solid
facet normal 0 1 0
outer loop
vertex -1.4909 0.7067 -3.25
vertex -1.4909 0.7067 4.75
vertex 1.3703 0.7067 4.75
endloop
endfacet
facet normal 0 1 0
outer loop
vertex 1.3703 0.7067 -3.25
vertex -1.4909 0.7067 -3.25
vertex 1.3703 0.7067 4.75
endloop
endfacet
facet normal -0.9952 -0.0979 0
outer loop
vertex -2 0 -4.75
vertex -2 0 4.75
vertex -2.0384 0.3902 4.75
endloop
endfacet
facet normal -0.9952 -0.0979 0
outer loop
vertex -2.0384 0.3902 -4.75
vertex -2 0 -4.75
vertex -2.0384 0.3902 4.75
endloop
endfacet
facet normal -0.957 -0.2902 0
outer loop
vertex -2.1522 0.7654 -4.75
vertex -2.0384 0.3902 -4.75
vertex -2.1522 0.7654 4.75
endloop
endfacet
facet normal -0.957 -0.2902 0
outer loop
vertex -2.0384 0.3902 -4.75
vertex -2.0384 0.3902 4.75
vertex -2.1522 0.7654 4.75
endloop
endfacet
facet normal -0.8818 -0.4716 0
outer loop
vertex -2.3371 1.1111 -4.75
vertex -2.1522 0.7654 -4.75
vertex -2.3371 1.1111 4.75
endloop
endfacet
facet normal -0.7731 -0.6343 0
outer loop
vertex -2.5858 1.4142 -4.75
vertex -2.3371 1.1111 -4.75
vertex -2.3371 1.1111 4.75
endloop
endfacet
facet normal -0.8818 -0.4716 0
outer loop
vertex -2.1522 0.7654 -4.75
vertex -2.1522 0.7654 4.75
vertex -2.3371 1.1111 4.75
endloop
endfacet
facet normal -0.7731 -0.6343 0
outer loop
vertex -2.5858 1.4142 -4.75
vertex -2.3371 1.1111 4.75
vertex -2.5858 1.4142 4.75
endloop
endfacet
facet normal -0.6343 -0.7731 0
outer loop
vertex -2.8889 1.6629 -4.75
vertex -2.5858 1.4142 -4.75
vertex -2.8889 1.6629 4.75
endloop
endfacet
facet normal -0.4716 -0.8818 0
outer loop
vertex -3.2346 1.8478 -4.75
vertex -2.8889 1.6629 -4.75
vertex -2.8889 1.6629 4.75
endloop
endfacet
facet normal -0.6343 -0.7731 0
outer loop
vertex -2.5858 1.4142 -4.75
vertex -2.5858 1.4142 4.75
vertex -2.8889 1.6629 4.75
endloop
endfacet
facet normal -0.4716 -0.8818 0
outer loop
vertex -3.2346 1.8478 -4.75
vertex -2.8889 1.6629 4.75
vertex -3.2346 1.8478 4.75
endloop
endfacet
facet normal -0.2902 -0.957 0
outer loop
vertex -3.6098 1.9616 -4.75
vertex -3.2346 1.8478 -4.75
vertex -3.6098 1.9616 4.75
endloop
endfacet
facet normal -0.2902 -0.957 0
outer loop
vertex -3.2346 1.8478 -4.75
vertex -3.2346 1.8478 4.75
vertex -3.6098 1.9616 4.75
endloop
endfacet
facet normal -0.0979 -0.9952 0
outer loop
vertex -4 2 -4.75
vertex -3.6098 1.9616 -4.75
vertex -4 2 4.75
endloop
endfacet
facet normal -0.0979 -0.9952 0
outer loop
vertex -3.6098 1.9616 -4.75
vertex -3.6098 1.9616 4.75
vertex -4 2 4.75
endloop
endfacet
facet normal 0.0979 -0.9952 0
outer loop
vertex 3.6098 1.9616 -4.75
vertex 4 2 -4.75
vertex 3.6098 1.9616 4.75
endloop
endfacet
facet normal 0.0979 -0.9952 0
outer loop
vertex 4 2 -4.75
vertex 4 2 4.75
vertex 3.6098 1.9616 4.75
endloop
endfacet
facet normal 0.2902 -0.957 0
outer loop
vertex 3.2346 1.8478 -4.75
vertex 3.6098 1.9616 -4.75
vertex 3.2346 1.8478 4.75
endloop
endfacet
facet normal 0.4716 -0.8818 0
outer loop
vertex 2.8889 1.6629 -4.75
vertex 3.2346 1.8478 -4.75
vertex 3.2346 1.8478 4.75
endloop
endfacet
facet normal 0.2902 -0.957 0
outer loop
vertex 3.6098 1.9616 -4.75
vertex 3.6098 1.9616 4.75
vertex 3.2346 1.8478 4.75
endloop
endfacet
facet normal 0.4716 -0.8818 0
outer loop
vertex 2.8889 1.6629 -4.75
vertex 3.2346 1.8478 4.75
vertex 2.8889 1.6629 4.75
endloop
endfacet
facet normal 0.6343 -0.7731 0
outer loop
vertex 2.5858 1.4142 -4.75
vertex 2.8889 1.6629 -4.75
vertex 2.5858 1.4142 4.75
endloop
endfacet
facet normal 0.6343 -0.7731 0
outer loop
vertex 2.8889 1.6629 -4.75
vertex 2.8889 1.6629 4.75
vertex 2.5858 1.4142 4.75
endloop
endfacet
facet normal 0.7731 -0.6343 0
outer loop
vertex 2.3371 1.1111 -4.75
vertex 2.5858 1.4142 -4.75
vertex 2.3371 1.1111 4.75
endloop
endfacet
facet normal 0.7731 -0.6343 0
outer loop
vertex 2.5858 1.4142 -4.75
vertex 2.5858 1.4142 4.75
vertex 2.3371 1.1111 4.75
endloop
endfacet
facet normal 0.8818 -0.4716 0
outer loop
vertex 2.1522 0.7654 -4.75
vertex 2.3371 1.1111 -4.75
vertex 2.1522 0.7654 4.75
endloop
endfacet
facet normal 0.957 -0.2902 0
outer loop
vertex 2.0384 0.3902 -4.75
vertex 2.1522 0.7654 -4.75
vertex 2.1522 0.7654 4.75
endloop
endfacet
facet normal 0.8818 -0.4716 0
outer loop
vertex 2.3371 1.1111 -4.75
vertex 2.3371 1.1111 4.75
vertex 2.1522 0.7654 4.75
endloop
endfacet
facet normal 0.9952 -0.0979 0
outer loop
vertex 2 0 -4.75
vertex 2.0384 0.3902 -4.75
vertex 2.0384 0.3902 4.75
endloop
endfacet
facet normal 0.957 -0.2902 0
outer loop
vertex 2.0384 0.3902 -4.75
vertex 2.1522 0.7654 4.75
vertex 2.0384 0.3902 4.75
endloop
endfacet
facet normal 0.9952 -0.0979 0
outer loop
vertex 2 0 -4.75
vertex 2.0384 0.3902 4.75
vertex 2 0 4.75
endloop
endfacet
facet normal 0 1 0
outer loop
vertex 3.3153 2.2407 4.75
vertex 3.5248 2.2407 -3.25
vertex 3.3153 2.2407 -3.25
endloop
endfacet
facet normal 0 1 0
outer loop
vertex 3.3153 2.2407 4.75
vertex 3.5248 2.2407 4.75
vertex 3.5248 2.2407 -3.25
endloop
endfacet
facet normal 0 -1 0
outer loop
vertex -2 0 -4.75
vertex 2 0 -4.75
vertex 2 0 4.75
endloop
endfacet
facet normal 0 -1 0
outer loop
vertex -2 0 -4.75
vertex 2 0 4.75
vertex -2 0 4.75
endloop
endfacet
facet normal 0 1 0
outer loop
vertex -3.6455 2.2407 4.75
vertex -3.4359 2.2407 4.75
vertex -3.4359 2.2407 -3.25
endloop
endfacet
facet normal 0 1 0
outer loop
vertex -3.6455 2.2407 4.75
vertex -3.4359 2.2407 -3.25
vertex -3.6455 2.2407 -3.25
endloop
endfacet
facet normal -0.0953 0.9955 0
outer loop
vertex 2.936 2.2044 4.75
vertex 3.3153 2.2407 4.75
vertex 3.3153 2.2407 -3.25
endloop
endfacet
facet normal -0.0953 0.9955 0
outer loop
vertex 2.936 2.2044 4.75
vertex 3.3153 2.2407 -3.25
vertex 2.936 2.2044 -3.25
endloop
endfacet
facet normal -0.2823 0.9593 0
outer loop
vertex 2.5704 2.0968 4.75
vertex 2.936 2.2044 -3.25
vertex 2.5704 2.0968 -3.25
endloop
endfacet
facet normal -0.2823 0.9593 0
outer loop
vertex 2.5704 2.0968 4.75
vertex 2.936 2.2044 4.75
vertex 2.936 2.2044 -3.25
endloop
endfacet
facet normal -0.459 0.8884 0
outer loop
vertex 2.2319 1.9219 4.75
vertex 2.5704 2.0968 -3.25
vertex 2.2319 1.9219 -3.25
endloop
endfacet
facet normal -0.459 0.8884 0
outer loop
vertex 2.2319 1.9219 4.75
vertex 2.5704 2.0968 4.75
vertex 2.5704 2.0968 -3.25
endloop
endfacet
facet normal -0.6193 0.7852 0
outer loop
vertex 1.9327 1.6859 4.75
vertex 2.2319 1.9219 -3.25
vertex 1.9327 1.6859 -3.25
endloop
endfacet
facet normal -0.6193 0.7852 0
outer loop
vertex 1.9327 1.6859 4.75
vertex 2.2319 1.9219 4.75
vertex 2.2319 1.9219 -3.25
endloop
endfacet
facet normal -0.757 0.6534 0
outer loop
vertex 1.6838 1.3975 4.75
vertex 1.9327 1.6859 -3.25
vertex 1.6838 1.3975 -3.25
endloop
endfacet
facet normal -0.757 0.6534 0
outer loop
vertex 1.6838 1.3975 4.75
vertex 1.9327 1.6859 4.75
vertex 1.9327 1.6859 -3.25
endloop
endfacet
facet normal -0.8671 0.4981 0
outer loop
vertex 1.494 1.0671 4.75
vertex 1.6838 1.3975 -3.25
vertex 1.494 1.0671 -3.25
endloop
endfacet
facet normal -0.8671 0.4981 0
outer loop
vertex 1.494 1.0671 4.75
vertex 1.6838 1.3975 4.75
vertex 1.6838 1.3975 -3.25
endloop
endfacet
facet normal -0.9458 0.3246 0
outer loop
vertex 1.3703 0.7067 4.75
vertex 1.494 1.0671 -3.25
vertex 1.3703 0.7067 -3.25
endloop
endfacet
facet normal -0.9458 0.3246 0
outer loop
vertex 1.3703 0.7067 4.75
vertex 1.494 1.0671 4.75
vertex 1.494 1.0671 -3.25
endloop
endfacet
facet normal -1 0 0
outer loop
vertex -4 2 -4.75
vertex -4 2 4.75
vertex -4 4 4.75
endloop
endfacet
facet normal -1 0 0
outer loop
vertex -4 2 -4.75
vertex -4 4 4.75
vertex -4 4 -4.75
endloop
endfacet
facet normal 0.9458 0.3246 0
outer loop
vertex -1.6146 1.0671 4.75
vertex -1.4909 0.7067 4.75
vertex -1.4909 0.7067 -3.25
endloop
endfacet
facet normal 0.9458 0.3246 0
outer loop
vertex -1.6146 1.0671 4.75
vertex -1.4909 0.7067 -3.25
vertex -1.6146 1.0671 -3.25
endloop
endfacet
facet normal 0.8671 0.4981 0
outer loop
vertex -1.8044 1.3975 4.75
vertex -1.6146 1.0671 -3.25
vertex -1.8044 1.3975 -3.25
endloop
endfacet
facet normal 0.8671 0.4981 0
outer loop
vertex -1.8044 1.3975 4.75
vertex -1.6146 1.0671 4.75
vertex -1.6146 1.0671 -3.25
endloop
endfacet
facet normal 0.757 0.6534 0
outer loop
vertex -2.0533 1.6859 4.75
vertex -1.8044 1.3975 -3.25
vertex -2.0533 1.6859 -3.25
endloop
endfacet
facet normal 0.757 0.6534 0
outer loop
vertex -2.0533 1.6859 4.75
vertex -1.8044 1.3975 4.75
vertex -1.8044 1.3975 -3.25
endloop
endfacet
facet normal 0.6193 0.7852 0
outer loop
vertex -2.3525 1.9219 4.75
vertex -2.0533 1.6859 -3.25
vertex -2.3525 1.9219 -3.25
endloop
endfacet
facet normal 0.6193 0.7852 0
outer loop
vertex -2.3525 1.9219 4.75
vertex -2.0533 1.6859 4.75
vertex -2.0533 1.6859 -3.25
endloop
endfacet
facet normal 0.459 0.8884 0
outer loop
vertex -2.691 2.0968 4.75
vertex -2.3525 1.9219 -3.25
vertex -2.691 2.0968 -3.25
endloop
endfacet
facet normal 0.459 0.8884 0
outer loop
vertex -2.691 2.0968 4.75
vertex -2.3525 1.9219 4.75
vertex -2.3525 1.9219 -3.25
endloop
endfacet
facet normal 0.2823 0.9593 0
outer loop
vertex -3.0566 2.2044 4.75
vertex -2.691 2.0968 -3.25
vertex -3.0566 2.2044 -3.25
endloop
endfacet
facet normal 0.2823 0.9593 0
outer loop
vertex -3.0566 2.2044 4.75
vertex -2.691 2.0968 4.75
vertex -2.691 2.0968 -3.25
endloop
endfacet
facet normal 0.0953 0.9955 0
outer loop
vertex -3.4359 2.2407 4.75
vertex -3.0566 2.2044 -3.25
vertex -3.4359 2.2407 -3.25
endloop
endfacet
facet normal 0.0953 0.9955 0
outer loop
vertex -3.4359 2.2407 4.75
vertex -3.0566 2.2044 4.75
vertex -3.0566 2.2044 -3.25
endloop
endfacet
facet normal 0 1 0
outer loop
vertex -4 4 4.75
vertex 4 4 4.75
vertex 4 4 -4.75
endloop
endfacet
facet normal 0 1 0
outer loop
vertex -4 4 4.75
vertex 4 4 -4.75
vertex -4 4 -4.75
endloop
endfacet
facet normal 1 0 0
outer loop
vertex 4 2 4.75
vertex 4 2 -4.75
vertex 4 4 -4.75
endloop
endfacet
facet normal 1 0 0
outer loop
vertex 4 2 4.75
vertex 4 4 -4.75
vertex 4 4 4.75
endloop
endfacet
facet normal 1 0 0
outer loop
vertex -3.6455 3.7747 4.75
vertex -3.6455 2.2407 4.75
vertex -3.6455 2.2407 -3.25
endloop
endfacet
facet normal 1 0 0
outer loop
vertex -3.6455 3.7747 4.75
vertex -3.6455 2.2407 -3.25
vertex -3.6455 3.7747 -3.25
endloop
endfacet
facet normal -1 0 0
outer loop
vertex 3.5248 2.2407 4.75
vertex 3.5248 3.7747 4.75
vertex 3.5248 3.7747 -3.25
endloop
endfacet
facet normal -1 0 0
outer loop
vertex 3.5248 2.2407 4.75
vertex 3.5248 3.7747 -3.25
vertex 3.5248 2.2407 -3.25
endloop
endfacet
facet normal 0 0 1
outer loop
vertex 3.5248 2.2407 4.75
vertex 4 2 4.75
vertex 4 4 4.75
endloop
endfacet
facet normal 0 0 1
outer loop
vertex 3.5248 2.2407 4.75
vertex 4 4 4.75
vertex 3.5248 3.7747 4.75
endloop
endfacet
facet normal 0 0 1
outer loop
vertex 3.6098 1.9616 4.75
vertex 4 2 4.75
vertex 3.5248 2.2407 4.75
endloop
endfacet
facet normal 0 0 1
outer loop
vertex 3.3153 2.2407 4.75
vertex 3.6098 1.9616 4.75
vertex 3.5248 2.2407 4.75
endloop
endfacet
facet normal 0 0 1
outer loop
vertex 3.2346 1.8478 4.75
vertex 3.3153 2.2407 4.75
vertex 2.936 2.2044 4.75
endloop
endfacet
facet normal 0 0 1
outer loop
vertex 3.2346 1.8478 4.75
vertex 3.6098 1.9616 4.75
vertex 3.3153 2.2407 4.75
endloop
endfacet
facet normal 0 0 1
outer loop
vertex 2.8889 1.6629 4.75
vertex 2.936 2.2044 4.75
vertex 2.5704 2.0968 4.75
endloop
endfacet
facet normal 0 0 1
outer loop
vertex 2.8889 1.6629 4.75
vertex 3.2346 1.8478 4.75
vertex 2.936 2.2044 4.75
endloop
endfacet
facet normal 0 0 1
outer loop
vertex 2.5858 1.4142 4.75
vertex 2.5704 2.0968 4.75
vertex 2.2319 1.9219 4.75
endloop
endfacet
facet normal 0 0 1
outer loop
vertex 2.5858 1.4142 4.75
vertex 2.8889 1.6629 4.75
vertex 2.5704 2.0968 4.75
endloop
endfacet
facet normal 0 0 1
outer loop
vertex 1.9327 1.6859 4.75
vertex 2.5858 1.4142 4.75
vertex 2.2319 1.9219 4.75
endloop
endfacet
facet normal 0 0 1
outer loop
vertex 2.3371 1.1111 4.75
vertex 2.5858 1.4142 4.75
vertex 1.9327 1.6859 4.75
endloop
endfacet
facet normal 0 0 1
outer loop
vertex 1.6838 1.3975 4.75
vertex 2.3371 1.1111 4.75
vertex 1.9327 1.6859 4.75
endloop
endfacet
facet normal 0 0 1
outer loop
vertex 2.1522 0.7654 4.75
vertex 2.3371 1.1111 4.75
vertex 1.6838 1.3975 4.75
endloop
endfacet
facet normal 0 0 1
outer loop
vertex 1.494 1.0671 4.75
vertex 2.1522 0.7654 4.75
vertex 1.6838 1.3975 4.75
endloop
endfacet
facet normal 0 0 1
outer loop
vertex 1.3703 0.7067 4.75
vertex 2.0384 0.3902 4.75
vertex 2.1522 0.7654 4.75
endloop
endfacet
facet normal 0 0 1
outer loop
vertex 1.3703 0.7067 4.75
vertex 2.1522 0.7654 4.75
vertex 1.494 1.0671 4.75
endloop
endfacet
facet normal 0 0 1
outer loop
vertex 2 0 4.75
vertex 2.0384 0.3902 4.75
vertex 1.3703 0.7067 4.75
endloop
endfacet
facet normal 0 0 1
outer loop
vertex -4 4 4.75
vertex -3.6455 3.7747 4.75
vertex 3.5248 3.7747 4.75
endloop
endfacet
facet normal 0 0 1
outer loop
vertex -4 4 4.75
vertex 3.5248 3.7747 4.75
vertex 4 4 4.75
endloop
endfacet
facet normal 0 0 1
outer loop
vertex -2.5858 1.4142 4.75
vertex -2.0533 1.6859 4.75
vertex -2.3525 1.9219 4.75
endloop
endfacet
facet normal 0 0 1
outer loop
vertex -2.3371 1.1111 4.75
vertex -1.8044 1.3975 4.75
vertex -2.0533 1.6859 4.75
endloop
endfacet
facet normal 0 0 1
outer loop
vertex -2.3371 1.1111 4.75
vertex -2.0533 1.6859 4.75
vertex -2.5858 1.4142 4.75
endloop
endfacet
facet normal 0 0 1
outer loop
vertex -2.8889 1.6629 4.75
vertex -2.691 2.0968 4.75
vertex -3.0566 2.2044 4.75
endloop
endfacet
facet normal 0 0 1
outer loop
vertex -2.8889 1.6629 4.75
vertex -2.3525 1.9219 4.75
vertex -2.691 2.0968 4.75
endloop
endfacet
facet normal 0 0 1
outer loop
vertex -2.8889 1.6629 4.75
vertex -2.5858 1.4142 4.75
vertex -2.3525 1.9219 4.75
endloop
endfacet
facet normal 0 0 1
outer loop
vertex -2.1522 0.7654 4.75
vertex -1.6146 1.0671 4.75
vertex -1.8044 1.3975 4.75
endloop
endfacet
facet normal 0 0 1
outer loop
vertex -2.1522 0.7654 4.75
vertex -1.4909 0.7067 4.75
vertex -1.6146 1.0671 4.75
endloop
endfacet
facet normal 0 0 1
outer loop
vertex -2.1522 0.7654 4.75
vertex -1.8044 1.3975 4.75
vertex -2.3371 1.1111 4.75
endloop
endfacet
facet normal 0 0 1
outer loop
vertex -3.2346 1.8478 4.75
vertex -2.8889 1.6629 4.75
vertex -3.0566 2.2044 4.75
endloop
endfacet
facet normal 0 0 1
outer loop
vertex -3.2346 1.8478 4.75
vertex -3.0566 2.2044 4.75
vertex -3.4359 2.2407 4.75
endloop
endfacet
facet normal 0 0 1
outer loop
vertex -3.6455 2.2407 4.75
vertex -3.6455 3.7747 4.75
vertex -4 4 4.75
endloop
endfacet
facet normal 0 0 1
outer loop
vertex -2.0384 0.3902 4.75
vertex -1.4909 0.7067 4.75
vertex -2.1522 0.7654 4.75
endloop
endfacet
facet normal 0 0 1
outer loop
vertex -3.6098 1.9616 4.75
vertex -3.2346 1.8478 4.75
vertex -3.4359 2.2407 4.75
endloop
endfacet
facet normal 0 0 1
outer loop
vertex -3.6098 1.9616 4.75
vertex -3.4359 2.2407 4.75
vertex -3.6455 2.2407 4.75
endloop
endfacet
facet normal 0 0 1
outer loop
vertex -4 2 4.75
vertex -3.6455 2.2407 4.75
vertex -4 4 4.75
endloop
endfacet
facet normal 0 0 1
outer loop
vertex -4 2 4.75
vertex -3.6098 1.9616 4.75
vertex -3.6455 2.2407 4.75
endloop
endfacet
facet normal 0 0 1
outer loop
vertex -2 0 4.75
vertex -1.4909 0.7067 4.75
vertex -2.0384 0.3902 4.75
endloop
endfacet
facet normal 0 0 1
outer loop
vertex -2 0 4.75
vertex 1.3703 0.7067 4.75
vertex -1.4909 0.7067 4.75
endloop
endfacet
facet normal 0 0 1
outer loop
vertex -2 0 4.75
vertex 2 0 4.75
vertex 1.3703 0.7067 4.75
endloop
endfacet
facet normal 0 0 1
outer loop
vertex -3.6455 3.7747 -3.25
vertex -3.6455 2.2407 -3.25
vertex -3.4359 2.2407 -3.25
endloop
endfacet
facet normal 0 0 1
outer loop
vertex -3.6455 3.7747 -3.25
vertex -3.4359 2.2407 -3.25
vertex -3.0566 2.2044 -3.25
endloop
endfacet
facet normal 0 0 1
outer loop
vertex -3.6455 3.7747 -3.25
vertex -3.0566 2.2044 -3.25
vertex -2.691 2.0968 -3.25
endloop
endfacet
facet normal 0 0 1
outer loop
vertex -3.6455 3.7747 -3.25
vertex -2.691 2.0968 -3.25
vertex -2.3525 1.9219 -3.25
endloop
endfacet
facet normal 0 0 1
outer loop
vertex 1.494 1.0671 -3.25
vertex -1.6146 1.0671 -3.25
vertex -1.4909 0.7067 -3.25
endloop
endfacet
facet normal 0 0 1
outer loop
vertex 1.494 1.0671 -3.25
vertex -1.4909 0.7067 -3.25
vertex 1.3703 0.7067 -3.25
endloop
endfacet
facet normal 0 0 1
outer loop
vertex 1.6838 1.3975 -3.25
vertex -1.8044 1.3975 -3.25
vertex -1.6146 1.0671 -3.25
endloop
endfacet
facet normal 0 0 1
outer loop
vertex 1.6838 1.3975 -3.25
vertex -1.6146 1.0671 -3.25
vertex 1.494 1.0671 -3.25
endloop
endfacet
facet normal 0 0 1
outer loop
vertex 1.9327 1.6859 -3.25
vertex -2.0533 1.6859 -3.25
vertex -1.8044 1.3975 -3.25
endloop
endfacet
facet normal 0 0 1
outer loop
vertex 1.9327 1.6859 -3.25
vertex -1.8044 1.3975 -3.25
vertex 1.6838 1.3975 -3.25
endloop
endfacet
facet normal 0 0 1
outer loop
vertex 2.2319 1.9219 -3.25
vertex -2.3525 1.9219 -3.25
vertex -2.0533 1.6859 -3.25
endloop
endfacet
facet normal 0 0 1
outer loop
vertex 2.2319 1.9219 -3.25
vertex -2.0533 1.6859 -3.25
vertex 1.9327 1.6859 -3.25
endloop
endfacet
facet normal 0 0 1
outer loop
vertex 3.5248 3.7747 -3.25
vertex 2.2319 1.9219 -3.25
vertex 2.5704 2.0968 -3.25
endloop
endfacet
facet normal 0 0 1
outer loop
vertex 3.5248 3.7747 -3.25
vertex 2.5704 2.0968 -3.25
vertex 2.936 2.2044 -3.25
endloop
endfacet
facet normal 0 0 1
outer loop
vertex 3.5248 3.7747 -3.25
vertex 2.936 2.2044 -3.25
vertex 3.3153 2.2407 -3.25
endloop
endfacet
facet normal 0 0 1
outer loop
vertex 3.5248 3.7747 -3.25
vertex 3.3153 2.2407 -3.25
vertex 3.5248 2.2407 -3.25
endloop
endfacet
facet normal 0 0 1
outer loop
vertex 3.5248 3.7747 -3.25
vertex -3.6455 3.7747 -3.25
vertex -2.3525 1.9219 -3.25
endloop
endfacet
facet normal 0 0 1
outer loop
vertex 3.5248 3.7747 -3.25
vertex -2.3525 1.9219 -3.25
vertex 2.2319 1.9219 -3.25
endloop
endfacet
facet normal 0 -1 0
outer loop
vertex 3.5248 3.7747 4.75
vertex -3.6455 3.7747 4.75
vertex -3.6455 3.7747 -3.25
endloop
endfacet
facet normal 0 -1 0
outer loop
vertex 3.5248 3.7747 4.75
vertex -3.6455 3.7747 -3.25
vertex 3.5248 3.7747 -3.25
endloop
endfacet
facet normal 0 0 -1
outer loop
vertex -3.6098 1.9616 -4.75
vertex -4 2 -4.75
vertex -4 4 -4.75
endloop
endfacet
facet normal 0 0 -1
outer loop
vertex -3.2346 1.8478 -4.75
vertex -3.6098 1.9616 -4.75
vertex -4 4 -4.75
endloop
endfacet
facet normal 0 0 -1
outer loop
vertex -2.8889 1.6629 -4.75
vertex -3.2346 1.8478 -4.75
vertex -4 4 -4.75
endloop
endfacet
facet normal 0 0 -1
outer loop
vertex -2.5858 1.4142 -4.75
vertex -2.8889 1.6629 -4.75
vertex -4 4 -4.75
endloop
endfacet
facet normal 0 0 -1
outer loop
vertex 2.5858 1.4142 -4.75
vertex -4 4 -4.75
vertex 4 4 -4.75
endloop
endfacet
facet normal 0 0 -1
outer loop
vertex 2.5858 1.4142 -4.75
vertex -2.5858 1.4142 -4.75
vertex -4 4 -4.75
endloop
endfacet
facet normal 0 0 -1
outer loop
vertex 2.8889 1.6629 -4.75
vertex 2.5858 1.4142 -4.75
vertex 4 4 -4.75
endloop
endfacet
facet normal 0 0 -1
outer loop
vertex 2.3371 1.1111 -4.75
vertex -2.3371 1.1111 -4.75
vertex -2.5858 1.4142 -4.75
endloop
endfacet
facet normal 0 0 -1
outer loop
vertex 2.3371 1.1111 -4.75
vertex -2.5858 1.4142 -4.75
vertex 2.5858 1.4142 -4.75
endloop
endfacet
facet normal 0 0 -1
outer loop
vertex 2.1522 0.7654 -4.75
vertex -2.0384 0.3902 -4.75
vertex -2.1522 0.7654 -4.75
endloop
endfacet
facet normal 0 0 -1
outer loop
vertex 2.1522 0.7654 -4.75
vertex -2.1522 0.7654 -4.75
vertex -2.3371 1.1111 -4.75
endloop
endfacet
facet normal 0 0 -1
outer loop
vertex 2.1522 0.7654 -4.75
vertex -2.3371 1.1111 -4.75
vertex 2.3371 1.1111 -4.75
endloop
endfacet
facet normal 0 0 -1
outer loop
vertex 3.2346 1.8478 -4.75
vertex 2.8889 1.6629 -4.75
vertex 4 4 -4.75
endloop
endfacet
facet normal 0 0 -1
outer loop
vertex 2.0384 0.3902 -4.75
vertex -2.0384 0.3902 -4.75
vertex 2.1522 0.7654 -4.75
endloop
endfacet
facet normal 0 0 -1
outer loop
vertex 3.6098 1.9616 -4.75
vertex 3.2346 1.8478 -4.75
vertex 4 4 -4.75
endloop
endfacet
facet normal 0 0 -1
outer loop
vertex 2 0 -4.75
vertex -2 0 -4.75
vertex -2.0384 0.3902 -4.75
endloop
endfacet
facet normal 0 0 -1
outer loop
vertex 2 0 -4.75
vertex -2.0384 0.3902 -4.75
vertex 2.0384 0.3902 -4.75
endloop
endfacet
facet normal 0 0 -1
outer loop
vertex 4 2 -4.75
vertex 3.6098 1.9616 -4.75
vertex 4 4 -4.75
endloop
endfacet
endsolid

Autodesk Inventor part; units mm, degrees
ref_plane "YZ Plane" through (0, 0, 0) normal (1, 0, 0) x (0, 1, 0)
ref_plane "XZ Plane" through (0, 0, 0) normal (0, 1, 0) x (-1, 0, 0)
ref_plane "XY Plane" through (0, 0, 0) normal (0, 0, 1) x (1, 0, 0)
sketch "Sketch1" plane through (0, 0, 0) normal (0, 1, 0) x (-1, 0, 0)
  line L0 (-4, 4.75) -> (4, 4.75)
  line L1 (4, 4.75) -> (4, -4.75)
  line L2 (4, -4.75) -> (-4, -4.75)
  line L3 (-4, -4.75) -> (-4, 4.75)
  line L4 (-4, 4.75) -> (4, -4.75) construction
  line L5 (4, 4.75) -> (-4, -4.75) construction
  point P0 (0, 0)
  dimension "d0" = 8
  dimension "d1" = 9.5
extrude "Extrusion1" add sketch "Sketch1" along normal blind 4
sketch "Sketch2" plane through (-4, 0, 4.75) normal (0, 0, 1) x (1, 0, 0)
  circle A0 centre (0, 0) radius 2
  circle A1 centre (8, 0) radius 2
  point P0 (4, 0)
  dimension "d4" = 4
  dimension "d5" = 4
extrude "Extrusion2" cut sketch "Sketch2" against normal blind 10
sketch "Sketch3" plane through (-4, 4, 4.75) normal (0, 0, 1) x (1, 0, 0)
  line L0 (0.3545, -0.2253) -> (7.5248, -0.2253)
  line L1 (7.5248, -0.2253) -> (7.5248, -1.7593)
  line L2 (7.5248, -1.7593) -> (0.3545, -1.7593)
  line L3 (0.3545, -1.7593) -> (0.3545, -0.2253)
  line L4 (2.5091, -3.2933) -> (5.3703, -3.2933)
  line L5 (5.3703, -3.2933) -> (5.3703, -0.2253)
  line L6 (5.3703, -0.2253) -> (2.5091, -0.2253)
  line L7 (2.5091, -0.2253) -> (2.5091, -3.2933)
  line L8 (2.5091, -3.2933) -> (5.3703, -0.2253) construction
  line L9 (5.3703, -3.2933) -> (2.5091, -0.2253) construction
  point P0 (4, -4)
  point P1 (3.9397, -1.7593)
extrude "Extrusion3" cut sketch "Sketch3" against normal blind 8
fillet "Fillet1" radius 2 2 edges at (-1.4909, 2.2407, 0.75) (1.3703, 2.2407, 0.75)
properties part number "USB-slot"
